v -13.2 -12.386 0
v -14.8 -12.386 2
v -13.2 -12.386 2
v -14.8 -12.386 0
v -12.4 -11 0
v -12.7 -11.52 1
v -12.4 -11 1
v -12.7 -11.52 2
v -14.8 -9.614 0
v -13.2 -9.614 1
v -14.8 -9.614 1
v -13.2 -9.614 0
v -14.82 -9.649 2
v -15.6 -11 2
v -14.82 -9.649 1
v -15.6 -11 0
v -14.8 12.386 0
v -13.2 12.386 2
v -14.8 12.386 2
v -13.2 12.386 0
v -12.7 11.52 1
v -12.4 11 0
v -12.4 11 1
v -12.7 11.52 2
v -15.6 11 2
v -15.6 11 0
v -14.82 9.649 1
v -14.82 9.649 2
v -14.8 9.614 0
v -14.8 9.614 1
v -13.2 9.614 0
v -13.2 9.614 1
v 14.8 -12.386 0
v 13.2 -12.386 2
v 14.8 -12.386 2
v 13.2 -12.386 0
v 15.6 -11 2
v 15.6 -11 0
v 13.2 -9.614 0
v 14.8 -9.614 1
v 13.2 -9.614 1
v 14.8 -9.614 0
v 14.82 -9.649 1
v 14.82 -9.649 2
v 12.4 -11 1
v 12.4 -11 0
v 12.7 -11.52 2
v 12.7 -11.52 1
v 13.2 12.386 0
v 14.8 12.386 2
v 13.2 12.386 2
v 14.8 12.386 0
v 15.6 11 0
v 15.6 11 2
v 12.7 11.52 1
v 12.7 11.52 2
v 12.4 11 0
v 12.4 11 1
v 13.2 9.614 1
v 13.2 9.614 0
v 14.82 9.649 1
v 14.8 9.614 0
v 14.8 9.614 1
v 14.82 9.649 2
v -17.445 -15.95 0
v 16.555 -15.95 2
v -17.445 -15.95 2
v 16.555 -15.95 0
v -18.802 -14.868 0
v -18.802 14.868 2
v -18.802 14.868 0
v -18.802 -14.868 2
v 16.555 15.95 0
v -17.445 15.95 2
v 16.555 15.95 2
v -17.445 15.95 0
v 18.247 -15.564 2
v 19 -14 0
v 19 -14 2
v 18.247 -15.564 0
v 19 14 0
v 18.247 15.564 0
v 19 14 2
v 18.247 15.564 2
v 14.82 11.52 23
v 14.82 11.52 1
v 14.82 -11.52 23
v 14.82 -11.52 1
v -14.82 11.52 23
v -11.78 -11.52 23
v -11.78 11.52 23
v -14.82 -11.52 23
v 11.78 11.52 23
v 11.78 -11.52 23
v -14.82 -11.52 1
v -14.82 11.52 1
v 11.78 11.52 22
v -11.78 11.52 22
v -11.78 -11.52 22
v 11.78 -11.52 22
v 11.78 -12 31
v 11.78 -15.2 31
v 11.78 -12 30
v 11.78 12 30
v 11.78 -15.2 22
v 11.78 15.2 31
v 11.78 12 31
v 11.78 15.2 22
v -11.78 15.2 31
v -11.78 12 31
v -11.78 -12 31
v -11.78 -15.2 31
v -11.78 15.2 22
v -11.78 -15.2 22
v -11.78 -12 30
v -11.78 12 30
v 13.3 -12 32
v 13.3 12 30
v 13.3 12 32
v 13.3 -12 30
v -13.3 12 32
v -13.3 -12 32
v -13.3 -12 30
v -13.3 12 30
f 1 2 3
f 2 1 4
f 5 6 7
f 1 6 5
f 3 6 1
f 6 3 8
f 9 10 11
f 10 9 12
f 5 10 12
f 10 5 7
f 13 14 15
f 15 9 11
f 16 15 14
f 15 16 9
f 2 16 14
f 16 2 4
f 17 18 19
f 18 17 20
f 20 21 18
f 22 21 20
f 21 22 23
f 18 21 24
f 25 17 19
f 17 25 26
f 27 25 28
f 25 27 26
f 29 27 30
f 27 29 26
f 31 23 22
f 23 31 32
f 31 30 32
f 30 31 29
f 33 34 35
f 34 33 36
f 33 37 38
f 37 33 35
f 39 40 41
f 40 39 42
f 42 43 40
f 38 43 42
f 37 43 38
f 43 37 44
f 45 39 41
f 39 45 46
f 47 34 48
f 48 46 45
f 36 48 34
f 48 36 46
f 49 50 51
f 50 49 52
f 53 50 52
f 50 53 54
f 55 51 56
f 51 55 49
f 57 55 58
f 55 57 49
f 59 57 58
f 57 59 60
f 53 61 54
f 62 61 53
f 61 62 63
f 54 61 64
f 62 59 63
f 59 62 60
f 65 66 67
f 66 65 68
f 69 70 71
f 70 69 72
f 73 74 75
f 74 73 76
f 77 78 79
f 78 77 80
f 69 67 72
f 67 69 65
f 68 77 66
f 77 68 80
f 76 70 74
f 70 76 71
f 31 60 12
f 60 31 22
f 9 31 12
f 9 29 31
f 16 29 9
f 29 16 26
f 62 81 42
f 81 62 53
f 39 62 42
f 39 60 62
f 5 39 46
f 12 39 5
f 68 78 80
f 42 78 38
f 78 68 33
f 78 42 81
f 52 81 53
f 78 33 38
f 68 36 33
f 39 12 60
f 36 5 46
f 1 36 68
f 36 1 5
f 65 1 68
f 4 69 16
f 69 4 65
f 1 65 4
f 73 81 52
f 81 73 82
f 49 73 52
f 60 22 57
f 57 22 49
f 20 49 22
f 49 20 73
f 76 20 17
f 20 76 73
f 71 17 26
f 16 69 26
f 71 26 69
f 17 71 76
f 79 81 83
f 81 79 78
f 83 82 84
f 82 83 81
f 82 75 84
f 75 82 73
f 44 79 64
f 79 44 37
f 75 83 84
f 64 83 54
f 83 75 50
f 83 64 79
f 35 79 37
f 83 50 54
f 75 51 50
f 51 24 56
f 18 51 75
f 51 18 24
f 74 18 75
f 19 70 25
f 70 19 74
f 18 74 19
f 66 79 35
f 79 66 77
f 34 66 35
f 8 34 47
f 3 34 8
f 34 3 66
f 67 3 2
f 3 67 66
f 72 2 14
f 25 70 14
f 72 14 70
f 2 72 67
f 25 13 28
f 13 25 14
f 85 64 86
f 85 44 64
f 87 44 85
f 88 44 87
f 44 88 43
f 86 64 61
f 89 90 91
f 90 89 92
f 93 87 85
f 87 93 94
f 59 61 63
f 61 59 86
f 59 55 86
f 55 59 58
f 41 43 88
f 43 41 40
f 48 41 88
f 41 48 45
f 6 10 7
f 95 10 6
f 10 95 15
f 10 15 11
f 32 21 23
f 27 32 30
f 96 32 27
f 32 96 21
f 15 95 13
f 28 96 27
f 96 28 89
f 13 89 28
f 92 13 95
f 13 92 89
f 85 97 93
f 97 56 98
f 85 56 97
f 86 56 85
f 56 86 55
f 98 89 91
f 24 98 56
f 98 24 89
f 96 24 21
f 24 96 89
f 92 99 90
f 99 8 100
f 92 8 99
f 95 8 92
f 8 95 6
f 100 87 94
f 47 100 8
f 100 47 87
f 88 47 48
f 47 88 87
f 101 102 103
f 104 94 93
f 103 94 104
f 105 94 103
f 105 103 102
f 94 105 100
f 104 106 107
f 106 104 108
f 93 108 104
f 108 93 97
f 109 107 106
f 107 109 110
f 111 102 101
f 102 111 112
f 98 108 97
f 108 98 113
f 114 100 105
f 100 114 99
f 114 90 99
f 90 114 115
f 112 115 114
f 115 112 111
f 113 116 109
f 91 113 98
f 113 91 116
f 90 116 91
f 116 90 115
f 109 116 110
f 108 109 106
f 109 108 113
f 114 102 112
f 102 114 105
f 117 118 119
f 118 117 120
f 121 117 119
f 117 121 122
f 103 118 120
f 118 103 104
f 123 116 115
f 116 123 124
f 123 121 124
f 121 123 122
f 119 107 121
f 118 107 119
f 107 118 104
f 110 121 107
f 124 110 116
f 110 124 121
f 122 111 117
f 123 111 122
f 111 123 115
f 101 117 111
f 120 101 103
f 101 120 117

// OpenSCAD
// Parameters
width_mm = 38; //[19:76:0.5]
depth_mm = 32; //[16:64:0.5]
height_mm = 33; //[16.5:66:0.5]
corner_radius_mm = 2; //[1:4:0.25]
mount_hole_diameter_mm = 3.2; //[2:6.4:0.1]
mount_hole_spacing_x_mm = 28; //[14:56:0.5]
mount_hole_spacing_y_mm = 22; //[11:44:0.5]
footplate_thickness_mm = 2; //[1:4:0.25]
lamination_height_mm = 22; //[11:44:0.5]
bobbin_height_mm = 9; //[4.5:18:0.5]
terminal_height_mm = 2; //[1:6:0.25]
lamination_width_ratio = 0.78; //[0.6:0.9:0.01]
lamination_depth_ratio = 0.72; //[0.55:0.9:0.01]
bobbin_width_ratio = 0.62; //[0.45:0.85:0.01]
bobbin_depth_ratio = 0.95; //[0.7:1:0.01]
terminal_width_ratio = 0.7; //[0.5:0.95:0.01]
terminal_depth_ratio = 0.75; //[0.5:0.95:0.01]
connect_overlap_mm = 1; //[0.5:2:0.1]

// Transformer - complete geometry
module transformer() {
  // Footplate with rounded corners
  color("DimGray") {
    difference() {
      hull() {
        translate([width_mm/2 - corner_radius_mm, depth_mm/2 - corner_radius_mm, footplate_thickness_mm/2])
          cylinder(r=corner_radius_mm, h=footplate_thickness_mm, center=true);
        translate([-width_mm/2 + corner_radius_mm, depth_mm/2 - corner_radius_mm, footplate_thickness_mm/2])
          cylinder(r=corner_radius_mm, h=footplate_thickness_mm, center=true);
        translate([-width_mm/2 + corner_radius_mm, -depth_mm/2 + corner_radius_mm, footplate_thickness_mm/2])
          cylinder(r=corner_radius_mm, h=footplate_thickness_mm, center=true);
        translate([width_mm/2 - corner_radius_mm, -depth_mm/2 + corner_radius_mm, footplate_thickness_mm/2])
          cylinder(r=corner_radius_mm, h=footplate_thickness_mm, center=true);
        translate([0, 0, footplate_thickness_mm/2])
          cube([width_mm - 2*corner_radius_mm, depth_mm - 2*corner_radius_mm, footplate_thickness_mm], center=true);
      }
      // Mounting holes
      for (x = [-1, 1])
        for (y = [-1, 1])
          translate([x * mount_hole_spacing_x_mm/2, y * mount_hole_spacing_y_mm/2, footplate_thickness_mm/2])
            cylinder(r=mount_hole_diameter_mm/2, h=footplate_thickness_mm + 2*connect_overlap_mm, center=true);
    }
  }

  // Lamination stack
  color("Black") {
    translate([0, 0, footplate_thickness_mm + lamination_height_mm/2 - connect_overlap_mm])
      cube([width_mm * lamination_width_ratio, depth_mm * lamination_depth_ratio, lamination_height_mm], center=true);
  }

  // Bobbin/coil block
  color("Silver") {
    translate([0, 0, footplate_thickness_mm + lamination_height_mm - connect_overlap_mm + bobbin_height_mm/2 - connect_overlap_mm])
      cube([width_mm * bobbin_width_ratio, depth_mm * bobbin_depth_ratio, bobbin_height_mm], center=true);
  }

  // Terminal block
  color("Copper") {
    translate([0, 0, footplate_thickness_mm + lamination_height_mm + bobbin_height_mm - 2*connect_overlap_mm + terminal_height_mm/2 - connect_overlap_mm])
      cube([width_mm * terminal_width_ratio, depth_mm * terminal_depth_ratio, terminal_height_mm], center=true);
  }
}

// Assembly
module assembly() {
  transformer();
}

assembly();
